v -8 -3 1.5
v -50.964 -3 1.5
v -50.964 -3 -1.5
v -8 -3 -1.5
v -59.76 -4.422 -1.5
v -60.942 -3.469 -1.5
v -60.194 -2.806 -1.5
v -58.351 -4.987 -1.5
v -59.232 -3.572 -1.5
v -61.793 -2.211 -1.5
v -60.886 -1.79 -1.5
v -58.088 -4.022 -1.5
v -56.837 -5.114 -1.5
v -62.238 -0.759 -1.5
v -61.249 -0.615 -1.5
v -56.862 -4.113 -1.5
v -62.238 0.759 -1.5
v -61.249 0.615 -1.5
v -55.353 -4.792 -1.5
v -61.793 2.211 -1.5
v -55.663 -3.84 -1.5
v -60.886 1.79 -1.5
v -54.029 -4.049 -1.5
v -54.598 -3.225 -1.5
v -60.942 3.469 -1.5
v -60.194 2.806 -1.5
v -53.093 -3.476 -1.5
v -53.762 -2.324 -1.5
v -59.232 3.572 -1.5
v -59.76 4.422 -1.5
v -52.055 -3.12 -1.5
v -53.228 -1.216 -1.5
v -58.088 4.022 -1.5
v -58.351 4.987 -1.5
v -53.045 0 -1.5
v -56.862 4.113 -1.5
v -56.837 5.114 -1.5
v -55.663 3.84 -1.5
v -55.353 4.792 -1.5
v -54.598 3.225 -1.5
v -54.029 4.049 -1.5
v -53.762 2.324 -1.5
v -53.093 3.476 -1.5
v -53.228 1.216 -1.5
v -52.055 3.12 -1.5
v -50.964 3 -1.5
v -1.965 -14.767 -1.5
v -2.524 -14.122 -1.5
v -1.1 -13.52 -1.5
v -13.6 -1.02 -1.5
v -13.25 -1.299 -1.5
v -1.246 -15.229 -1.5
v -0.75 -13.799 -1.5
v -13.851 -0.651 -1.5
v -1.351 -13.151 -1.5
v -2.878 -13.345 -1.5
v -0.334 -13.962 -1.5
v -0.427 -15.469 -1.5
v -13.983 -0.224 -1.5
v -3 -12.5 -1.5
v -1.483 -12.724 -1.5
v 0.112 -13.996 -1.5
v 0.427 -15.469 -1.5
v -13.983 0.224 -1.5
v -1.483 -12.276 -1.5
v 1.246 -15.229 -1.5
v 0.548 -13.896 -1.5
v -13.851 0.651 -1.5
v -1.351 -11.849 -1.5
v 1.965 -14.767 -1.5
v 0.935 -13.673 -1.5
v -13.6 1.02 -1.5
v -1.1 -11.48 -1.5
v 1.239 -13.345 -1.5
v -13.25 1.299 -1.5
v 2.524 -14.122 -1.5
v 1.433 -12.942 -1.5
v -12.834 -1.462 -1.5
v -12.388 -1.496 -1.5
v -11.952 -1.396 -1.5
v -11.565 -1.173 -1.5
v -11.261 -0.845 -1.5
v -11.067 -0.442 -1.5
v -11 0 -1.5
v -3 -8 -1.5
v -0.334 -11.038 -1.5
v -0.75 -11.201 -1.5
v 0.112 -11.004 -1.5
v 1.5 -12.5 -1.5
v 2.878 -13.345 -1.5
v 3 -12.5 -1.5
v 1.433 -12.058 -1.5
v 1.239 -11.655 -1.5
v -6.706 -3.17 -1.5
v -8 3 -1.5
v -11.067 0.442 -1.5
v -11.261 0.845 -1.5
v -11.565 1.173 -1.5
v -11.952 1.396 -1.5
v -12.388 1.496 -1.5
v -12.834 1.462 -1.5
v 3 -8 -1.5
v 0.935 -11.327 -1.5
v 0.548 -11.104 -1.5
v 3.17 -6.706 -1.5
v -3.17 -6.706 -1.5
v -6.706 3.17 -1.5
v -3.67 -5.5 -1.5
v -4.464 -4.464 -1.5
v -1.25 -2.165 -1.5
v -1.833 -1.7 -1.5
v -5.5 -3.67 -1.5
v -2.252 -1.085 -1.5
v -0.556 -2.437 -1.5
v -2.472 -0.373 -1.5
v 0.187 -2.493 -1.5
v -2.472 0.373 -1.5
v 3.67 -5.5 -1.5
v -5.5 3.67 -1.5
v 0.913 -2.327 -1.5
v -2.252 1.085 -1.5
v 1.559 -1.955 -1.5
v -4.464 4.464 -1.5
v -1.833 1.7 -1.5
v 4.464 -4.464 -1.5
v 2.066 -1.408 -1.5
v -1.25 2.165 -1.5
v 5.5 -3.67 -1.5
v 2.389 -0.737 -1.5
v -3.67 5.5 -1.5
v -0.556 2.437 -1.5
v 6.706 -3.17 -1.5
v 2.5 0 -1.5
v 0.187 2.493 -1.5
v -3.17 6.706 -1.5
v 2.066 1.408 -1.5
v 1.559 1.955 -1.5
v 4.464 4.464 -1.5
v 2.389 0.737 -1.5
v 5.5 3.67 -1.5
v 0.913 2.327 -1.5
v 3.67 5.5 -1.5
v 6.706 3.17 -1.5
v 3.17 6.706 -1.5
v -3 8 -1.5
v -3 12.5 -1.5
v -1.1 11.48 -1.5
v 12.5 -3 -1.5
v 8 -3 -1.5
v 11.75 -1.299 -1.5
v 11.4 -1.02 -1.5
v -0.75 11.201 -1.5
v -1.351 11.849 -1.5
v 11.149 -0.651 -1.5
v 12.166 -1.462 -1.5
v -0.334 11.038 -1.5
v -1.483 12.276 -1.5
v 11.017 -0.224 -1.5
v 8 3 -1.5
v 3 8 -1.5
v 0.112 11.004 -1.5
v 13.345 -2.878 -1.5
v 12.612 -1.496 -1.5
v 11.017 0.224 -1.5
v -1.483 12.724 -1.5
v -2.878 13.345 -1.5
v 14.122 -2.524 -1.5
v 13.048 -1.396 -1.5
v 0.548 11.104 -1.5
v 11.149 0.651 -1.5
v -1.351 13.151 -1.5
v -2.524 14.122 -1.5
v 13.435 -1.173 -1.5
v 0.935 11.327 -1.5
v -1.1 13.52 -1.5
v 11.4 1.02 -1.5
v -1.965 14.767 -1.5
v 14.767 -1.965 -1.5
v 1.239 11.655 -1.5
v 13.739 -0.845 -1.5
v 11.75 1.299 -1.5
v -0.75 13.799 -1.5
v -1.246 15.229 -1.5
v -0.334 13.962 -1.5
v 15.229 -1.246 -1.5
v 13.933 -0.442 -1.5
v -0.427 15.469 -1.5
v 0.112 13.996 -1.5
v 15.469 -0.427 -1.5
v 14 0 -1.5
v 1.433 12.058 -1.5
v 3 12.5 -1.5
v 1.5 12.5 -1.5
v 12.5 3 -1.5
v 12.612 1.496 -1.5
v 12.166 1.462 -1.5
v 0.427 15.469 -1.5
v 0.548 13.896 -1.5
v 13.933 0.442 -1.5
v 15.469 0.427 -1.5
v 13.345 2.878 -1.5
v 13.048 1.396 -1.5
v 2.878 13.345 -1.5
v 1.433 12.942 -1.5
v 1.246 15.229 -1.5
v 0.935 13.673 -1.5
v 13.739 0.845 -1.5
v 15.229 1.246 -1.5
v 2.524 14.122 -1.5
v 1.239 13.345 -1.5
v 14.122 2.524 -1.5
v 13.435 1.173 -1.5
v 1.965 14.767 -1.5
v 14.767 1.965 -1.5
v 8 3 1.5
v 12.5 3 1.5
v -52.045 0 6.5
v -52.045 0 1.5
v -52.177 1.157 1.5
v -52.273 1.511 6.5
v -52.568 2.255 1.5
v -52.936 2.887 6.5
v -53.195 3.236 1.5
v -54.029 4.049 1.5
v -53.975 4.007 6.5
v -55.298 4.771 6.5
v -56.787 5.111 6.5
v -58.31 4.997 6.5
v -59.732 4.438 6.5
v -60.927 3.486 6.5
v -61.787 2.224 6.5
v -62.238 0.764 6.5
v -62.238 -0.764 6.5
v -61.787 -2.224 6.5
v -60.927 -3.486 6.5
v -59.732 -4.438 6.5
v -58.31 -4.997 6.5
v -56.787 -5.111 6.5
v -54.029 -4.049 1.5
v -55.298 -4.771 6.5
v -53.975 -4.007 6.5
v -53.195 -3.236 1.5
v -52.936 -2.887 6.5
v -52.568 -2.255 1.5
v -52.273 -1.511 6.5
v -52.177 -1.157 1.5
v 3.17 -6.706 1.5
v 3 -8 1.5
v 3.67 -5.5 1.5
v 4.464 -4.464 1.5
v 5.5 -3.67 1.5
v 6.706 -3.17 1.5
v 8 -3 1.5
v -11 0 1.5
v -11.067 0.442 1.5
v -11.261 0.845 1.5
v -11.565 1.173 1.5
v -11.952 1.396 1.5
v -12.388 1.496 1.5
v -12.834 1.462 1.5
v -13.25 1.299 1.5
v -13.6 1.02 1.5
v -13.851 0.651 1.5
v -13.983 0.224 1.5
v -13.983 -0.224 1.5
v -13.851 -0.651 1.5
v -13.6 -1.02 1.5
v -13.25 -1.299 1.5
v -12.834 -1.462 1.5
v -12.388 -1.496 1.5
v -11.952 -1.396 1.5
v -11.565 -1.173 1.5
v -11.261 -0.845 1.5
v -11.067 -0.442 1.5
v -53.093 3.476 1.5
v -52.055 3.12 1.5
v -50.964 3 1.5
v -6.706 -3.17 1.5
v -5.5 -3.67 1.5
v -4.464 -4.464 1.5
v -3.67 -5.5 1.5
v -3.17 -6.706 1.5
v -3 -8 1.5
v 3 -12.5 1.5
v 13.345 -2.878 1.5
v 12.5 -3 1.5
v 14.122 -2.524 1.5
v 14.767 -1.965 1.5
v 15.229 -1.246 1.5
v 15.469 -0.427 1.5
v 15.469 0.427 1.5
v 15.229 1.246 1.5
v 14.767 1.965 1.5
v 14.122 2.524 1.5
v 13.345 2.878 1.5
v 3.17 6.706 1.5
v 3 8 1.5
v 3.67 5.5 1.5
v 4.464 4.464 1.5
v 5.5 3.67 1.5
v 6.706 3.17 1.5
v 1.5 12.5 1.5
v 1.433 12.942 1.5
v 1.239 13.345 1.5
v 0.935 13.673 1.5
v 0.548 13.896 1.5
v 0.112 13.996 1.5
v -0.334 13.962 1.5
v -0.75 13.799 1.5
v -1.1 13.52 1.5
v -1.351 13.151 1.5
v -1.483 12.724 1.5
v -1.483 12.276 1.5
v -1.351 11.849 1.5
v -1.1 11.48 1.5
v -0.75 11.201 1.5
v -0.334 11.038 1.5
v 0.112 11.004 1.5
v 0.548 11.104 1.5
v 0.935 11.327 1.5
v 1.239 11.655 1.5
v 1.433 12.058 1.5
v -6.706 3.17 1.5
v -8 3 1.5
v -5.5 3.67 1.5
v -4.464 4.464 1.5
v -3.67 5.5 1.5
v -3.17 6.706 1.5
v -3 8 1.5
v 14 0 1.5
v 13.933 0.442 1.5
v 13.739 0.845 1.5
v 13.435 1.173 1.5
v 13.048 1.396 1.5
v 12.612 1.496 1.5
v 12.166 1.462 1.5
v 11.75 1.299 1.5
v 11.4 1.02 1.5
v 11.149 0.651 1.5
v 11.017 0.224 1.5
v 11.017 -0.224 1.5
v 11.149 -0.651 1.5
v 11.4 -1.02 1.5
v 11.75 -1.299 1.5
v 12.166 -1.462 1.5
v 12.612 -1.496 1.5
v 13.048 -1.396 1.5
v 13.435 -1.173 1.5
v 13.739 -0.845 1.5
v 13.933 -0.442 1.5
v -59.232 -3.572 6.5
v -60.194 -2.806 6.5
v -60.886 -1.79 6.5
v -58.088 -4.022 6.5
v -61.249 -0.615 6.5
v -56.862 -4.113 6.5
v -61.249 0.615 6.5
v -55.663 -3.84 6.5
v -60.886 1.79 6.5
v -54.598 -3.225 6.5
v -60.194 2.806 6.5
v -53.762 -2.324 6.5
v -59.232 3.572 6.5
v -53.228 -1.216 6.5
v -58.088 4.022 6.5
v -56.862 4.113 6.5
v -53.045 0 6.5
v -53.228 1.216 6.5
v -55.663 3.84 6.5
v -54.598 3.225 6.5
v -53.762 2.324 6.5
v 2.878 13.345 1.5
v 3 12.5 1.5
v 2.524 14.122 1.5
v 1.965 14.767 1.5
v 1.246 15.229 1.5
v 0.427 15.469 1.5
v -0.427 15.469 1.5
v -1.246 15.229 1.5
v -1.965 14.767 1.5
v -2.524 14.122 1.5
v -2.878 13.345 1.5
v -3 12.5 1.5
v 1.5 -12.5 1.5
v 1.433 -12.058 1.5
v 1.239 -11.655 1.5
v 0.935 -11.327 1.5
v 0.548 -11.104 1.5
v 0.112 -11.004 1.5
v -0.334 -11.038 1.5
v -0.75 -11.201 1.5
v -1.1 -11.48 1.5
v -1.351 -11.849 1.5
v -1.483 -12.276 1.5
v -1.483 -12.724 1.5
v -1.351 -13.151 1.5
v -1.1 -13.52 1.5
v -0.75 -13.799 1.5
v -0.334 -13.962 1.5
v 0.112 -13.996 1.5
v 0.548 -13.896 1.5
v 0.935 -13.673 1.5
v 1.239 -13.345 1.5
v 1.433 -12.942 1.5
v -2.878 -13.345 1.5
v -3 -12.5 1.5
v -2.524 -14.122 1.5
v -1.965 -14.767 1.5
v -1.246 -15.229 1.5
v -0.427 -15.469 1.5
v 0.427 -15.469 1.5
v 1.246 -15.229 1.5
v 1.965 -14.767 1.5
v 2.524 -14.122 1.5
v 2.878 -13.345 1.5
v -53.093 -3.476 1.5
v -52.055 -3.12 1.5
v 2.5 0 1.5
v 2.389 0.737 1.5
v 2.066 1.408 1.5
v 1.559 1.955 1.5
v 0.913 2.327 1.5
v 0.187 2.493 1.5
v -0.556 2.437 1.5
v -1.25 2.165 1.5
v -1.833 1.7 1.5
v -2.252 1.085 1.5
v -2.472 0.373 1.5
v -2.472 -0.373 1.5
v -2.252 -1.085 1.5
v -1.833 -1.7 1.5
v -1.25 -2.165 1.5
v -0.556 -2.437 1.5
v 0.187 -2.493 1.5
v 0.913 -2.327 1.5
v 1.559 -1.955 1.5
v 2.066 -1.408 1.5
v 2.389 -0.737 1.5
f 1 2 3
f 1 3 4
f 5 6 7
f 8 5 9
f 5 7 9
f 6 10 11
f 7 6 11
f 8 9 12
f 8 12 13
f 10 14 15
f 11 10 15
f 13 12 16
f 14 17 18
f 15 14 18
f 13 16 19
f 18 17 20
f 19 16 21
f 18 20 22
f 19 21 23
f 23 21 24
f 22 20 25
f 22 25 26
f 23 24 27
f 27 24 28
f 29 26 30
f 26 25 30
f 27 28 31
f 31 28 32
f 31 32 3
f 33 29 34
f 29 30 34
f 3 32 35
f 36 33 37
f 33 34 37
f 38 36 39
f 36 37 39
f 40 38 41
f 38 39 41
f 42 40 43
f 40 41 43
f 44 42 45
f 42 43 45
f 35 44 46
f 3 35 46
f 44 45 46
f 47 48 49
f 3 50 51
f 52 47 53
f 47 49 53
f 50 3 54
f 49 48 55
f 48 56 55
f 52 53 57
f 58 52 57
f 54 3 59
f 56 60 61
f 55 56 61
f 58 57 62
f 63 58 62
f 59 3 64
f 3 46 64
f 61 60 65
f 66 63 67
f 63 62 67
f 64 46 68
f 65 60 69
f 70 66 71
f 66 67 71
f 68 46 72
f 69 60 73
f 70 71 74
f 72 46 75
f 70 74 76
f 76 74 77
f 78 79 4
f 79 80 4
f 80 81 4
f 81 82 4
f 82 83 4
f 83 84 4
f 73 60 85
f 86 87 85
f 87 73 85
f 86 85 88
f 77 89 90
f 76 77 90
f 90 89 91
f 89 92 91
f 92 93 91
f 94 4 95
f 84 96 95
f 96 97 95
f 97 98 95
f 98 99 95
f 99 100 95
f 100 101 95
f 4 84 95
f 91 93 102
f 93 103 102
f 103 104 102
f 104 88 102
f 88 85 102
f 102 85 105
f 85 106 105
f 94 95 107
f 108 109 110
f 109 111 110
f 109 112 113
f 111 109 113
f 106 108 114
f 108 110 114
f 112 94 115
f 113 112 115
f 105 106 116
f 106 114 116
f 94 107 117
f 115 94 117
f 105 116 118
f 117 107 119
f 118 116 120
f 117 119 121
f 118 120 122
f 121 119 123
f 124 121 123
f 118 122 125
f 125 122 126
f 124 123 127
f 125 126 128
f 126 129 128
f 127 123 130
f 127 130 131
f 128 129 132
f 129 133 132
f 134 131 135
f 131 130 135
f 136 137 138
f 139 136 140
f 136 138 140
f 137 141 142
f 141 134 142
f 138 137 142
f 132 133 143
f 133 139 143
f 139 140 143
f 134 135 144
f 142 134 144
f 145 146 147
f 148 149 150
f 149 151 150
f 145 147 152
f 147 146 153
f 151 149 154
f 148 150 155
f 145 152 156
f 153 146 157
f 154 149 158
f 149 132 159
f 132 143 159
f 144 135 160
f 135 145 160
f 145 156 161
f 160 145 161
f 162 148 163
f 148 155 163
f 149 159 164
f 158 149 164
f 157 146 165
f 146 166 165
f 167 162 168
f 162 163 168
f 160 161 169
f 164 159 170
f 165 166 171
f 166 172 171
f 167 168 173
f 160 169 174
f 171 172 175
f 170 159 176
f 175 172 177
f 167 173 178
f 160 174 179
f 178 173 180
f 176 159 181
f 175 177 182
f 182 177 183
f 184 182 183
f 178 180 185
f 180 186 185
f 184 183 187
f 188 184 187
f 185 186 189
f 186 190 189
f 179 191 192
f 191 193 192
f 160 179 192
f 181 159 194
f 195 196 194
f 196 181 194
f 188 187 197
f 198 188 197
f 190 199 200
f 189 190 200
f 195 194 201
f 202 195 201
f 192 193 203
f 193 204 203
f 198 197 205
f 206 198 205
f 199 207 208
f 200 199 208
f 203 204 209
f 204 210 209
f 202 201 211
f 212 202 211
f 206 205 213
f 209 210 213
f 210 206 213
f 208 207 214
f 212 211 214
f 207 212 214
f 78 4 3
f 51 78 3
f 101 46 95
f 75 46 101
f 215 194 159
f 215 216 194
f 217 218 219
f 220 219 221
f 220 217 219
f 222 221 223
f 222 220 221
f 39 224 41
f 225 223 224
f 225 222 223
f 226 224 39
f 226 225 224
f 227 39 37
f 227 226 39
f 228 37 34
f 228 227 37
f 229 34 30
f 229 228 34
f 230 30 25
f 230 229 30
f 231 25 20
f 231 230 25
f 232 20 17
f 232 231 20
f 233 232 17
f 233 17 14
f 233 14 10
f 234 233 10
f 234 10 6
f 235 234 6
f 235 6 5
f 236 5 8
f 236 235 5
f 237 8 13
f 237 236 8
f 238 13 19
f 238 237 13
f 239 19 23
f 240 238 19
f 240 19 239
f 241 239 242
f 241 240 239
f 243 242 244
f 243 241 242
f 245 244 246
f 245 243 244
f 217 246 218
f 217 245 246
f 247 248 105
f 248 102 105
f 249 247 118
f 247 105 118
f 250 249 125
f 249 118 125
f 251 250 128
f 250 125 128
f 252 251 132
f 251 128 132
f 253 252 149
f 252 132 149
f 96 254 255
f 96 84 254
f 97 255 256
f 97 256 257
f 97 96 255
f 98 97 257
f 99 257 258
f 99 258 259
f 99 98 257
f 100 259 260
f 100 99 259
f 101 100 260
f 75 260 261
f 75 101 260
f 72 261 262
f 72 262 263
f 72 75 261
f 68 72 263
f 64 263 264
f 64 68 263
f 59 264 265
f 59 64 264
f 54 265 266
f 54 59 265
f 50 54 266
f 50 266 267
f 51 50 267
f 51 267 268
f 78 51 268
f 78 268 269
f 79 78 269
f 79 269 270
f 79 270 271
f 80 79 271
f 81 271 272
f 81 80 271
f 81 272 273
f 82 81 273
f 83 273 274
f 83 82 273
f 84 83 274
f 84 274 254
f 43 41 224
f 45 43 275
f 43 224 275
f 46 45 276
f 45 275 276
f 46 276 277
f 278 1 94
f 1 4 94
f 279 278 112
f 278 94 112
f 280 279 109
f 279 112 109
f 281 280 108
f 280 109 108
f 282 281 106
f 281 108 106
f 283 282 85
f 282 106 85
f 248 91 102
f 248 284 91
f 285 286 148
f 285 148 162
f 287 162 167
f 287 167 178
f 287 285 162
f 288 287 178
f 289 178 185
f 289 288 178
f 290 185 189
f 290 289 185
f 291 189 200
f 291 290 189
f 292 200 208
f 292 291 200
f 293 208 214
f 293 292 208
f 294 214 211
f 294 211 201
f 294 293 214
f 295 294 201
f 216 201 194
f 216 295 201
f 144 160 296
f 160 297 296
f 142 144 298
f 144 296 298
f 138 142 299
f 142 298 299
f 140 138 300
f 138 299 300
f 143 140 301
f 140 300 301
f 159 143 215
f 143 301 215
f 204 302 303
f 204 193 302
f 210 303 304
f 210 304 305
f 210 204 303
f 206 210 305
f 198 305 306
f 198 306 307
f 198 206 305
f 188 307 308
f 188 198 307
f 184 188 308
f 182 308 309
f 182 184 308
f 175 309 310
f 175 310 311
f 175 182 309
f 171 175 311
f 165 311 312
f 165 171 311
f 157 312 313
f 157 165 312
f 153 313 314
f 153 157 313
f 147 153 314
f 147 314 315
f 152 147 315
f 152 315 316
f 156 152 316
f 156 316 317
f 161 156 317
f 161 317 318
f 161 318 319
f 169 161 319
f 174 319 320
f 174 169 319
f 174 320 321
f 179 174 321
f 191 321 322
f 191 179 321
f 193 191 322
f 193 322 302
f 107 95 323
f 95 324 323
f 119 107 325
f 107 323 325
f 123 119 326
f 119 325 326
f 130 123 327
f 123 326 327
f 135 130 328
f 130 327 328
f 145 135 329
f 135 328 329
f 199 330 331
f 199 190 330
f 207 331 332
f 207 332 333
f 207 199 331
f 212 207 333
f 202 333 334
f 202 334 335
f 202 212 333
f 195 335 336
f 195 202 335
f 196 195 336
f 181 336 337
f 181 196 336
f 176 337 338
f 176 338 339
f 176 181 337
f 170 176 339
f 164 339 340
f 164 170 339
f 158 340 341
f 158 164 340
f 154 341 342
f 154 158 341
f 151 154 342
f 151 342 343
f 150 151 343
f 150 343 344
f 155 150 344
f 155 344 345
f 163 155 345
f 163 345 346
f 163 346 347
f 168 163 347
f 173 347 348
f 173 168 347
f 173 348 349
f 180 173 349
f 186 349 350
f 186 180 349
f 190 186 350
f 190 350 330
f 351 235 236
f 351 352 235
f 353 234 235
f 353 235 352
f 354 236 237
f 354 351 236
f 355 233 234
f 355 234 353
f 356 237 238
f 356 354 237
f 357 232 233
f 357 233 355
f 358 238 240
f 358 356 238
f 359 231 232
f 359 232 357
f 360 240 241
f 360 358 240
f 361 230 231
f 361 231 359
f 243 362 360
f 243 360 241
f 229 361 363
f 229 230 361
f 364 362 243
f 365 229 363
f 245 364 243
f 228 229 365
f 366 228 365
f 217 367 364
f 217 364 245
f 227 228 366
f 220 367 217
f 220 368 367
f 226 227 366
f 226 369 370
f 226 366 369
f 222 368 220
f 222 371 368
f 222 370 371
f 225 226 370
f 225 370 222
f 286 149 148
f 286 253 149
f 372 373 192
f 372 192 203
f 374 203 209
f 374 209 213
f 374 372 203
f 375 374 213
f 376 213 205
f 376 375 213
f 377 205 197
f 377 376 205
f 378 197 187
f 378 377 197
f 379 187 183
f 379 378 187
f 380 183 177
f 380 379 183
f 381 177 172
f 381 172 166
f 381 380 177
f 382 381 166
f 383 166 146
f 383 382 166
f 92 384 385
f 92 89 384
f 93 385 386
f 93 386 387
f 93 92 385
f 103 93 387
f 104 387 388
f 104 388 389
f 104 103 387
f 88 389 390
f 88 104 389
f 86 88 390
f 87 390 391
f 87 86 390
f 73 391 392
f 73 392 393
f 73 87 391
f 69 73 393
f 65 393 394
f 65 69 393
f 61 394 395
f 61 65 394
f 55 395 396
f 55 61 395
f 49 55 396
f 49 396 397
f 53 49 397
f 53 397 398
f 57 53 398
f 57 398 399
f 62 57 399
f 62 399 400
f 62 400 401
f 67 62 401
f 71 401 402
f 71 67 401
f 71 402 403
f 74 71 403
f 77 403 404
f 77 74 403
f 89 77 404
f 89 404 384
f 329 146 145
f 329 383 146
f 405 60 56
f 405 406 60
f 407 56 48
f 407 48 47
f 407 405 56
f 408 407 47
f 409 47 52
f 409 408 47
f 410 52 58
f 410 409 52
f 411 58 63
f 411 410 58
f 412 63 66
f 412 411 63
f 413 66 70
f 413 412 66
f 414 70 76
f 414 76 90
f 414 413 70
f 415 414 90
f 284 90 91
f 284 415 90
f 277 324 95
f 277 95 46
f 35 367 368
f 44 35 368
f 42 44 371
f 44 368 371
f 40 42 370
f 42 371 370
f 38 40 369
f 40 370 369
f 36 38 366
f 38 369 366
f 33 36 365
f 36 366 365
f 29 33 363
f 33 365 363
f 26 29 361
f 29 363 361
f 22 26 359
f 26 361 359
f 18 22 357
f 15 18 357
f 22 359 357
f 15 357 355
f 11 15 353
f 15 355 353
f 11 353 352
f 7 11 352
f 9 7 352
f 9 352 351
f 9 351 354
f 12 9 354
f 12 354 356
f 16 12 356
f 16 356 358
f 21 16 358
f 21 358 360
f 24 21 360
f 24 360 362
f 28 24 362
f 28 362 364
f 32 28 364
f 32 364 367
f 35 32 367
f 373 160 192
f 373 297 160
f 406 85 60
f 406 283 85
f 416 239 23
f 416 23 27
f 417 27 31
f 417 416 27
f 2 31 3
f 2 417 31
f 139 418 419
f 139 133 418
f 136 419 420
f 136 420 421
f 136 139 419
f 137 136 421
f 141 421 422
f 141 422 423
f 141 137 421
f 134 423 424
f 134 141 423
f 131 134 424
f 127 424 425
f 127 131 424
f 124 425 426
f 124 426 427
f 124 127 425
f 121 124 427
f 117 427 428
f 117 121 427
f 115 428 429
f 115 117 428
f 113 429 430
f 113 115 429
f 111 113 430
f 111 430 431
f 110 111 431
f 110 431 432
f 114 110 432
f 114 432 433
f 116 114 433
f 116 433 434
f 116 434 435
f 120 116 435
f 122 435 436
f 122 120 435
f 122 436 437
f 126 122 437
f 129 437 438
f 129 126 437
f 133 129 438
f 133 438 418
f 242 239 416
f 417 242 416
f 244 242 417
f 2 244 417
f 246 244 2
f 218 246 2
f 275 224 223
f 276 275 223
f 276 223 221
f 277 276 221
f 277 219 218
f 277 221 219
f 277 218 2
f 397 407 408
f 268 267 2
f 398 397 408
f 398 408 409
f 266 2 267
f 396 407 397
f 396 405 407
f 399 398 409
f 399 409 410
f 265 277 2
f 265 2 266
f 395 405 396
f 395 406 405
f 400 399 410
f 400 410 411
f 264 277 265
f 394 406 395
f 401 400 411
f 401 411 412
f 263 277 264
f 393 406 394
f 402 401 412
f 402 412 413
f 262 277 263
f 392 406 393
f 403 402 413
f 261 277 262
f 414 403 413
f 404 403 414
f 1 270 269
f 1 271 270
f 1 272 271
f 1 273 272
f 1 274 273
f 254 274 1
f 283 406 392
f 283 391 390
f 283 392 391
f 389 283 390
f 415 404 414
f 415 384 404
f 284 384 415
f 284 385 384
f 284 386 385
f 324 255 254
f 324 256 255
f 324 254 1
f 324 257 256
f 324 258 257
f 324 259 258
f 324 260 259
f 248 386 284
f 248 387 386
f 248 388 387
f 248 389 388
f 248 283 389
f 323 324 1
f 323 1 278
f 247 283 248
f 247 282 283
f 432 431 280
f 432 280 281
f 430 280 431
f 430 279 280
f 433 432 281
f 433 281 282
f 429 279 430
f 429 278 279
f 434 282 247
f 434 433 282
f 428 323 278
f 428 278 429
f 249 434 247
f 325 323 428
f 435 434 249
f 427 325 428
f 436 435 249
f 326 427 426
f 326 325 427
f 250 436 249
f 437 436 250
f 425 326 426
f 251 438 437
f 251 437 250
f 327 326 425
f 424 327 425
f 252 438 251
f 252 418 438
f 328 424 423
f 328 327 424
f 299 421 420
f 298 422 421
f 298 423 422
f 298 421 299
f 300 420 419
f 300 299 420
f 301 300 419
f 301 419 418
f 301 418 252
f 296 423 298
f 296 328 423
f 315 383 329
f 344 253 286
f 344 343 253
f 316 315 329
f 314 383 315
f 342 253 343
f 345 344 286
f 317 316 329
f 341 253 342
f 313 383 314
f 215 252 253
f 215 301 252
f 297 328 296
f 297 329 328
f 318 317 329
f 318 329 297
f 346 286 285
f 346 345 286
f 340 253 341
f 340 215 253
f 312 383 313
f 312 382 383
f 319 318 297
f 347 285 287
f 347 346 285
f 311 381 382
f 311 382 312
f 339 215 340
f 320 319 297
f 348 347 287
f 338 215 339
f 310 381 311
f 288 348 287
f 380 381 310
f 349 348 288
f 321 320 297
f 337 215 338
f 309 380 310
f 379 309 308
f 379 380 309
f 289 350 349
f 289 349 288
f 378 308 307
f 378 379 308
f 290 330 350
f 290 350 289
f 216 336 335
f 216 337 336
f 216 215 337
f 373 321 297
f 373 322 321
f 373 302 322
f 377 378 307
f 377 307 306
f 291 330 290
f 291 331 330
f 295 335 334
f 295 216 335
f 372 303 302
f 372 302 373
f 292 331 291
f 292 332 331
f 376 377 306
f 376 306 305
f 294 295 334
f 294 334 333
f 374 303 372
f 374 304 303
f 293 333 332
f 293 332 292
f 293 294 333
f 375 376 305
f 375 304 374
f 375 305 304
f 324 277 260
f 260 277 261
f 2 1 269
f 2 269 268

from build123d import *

# Parameters (mm, degrees)
ESBO_O1_R                            = 2.5
ESBO_O1_R_2                          = 1.5
RESSALTO_EXTRUS_O3_DEPTH             = 1.5
ESBO_O2_R                            = 5.125
RESSALTO_EXTRUS_O4_DEPTH             = 5
RESSALTO_EXTRUS_O4_DIRECTION_2_REACH = 64.207
ESBO_O3_R                            = 4.125
CORTE_EXTRUS_O1_DEPTH                = 10
FILETE1_R                            = 5


with BuildPart() as part:
    # Esboço1 → Ressalto-extrusão3 (new, symmetric)
    with BuildSketch(Plane.XY):
        with BuildLine():
            Line((3, -3), (12.5, -3))
            ThreePointArc((12.5, -3), (15.5, 0), (12.5, 3))
            Line((12.5, 3), (3, 3))
            Line((3, 3), (3, 12.5))
            ThreePointArc((3, 12.5), (0, 15.5), (-3, 12.5))
            Line((-3, 12.5), (-3, 3))
            Line((-3, 3), (-57.17, 3))
            ThreePointArc((-57.17, 3), (-60.17, 0), (-57.17, -3))
            Line((-57.17, -3), (-3, -3))
            Line((-3, -3), (-3, -12.5))
            ThreePointArc((-3, -12.5), (0, -15.5), (3, -12.5))
            Line((3, -12.5), (3, -3))
        make_face()
        Circle(ESBO_O1_R, mode=Mode.SUBTRACT)
        with Locations((-12.5, 0)):
            Circle(ESBO_O1_R_2, mode=Mode.SUBTRACT)
        with Locations((0, 12.5)):
            Circle(ESBO_O1_R_2, mode=Mode.SUBTRACT)
        with Locations((12.5, 0)):
            Circle(ESBO_O1_R_2, mode=Mode.SUBTRACT)
        with Locations((0, -12.5)):
            Circle(ESBO_O1_R_2, mode=Mode.SUBTRACT)
    extrude(amount=RESSALTO_EXTRUS_O3_DEPTH, both=True)

    # Esboço2 → Ressalto-extrusão4 (add)
    with BuildSketch(Plane.XY.offset(1.5)):
        with Locations((-57.17, 0)):
            Circle(ESBO_O2_R)
    extrude(amount=RESSALTO_EXTRUS_O4_DEPTH)

    # Ressalto-extrusão4 direction 2: up to this face of the body (flat: up to its plane)
    ressalto_extrus_o4_direction_2_end = Plane(part.part.faces().sort_by_distance((-18.436716942, 0, -1.5))[0])
    # Esboço2 → Ressalto-extrusão4 direction 2 (add, up to the picked face)
    with BuildSketch(Plane.XY.offset(1.5), mode=Mode.PRIVATE) as ressalto_extrus_o4_direction_2_sk1:
        with Locations((-57.17, 0)):
            Circle(ESBO_O2_R)
    ressalto_extrus_o4_direction_2_tool1 = split(extrude(ressalto_extrus_o4_direction_2_sk1.sketch, amount=-RESSALTO_EXTRUS_O4_DIRECTION_2_REACH, mode=Mode.PRIVATE), bisect_by=ressalto_extrus_o4_direction_2_end, keep=Keep.BOTH, mode=Mode.PRIVATE)
    add(ressalto_extrus_o4_direction_2_tool1.solids().sort_by(Axis((-57.17, 0, 1.5), (0, 0, -1)))[0])

    # Esboço3 → Corte-extrusão1 (cut)
    with BuildSketch(Plane.XY.offset(6.5)):
        with Locations((-57.17, 0)):
            Circle(ESBO_O3_R)
    extrude(amount=-CORTE_EXTRUS_O1_DEPTH, mode=Mode.SUBTRACT)

    # Filete1
    filete1_edges = [part.edges().sort_by_distance(p)[0] for p in [
        (3, -3, 0),
        (-3, -3, 0),
        (-3, 3, 0),
        (3, 3, 0),
        (-53.014807465, -3, 0),
        (-53.014807465, 3, 0),
    ]]
    fillet(filete1_edges, radius=FILETE1_R)


solid = part.part
